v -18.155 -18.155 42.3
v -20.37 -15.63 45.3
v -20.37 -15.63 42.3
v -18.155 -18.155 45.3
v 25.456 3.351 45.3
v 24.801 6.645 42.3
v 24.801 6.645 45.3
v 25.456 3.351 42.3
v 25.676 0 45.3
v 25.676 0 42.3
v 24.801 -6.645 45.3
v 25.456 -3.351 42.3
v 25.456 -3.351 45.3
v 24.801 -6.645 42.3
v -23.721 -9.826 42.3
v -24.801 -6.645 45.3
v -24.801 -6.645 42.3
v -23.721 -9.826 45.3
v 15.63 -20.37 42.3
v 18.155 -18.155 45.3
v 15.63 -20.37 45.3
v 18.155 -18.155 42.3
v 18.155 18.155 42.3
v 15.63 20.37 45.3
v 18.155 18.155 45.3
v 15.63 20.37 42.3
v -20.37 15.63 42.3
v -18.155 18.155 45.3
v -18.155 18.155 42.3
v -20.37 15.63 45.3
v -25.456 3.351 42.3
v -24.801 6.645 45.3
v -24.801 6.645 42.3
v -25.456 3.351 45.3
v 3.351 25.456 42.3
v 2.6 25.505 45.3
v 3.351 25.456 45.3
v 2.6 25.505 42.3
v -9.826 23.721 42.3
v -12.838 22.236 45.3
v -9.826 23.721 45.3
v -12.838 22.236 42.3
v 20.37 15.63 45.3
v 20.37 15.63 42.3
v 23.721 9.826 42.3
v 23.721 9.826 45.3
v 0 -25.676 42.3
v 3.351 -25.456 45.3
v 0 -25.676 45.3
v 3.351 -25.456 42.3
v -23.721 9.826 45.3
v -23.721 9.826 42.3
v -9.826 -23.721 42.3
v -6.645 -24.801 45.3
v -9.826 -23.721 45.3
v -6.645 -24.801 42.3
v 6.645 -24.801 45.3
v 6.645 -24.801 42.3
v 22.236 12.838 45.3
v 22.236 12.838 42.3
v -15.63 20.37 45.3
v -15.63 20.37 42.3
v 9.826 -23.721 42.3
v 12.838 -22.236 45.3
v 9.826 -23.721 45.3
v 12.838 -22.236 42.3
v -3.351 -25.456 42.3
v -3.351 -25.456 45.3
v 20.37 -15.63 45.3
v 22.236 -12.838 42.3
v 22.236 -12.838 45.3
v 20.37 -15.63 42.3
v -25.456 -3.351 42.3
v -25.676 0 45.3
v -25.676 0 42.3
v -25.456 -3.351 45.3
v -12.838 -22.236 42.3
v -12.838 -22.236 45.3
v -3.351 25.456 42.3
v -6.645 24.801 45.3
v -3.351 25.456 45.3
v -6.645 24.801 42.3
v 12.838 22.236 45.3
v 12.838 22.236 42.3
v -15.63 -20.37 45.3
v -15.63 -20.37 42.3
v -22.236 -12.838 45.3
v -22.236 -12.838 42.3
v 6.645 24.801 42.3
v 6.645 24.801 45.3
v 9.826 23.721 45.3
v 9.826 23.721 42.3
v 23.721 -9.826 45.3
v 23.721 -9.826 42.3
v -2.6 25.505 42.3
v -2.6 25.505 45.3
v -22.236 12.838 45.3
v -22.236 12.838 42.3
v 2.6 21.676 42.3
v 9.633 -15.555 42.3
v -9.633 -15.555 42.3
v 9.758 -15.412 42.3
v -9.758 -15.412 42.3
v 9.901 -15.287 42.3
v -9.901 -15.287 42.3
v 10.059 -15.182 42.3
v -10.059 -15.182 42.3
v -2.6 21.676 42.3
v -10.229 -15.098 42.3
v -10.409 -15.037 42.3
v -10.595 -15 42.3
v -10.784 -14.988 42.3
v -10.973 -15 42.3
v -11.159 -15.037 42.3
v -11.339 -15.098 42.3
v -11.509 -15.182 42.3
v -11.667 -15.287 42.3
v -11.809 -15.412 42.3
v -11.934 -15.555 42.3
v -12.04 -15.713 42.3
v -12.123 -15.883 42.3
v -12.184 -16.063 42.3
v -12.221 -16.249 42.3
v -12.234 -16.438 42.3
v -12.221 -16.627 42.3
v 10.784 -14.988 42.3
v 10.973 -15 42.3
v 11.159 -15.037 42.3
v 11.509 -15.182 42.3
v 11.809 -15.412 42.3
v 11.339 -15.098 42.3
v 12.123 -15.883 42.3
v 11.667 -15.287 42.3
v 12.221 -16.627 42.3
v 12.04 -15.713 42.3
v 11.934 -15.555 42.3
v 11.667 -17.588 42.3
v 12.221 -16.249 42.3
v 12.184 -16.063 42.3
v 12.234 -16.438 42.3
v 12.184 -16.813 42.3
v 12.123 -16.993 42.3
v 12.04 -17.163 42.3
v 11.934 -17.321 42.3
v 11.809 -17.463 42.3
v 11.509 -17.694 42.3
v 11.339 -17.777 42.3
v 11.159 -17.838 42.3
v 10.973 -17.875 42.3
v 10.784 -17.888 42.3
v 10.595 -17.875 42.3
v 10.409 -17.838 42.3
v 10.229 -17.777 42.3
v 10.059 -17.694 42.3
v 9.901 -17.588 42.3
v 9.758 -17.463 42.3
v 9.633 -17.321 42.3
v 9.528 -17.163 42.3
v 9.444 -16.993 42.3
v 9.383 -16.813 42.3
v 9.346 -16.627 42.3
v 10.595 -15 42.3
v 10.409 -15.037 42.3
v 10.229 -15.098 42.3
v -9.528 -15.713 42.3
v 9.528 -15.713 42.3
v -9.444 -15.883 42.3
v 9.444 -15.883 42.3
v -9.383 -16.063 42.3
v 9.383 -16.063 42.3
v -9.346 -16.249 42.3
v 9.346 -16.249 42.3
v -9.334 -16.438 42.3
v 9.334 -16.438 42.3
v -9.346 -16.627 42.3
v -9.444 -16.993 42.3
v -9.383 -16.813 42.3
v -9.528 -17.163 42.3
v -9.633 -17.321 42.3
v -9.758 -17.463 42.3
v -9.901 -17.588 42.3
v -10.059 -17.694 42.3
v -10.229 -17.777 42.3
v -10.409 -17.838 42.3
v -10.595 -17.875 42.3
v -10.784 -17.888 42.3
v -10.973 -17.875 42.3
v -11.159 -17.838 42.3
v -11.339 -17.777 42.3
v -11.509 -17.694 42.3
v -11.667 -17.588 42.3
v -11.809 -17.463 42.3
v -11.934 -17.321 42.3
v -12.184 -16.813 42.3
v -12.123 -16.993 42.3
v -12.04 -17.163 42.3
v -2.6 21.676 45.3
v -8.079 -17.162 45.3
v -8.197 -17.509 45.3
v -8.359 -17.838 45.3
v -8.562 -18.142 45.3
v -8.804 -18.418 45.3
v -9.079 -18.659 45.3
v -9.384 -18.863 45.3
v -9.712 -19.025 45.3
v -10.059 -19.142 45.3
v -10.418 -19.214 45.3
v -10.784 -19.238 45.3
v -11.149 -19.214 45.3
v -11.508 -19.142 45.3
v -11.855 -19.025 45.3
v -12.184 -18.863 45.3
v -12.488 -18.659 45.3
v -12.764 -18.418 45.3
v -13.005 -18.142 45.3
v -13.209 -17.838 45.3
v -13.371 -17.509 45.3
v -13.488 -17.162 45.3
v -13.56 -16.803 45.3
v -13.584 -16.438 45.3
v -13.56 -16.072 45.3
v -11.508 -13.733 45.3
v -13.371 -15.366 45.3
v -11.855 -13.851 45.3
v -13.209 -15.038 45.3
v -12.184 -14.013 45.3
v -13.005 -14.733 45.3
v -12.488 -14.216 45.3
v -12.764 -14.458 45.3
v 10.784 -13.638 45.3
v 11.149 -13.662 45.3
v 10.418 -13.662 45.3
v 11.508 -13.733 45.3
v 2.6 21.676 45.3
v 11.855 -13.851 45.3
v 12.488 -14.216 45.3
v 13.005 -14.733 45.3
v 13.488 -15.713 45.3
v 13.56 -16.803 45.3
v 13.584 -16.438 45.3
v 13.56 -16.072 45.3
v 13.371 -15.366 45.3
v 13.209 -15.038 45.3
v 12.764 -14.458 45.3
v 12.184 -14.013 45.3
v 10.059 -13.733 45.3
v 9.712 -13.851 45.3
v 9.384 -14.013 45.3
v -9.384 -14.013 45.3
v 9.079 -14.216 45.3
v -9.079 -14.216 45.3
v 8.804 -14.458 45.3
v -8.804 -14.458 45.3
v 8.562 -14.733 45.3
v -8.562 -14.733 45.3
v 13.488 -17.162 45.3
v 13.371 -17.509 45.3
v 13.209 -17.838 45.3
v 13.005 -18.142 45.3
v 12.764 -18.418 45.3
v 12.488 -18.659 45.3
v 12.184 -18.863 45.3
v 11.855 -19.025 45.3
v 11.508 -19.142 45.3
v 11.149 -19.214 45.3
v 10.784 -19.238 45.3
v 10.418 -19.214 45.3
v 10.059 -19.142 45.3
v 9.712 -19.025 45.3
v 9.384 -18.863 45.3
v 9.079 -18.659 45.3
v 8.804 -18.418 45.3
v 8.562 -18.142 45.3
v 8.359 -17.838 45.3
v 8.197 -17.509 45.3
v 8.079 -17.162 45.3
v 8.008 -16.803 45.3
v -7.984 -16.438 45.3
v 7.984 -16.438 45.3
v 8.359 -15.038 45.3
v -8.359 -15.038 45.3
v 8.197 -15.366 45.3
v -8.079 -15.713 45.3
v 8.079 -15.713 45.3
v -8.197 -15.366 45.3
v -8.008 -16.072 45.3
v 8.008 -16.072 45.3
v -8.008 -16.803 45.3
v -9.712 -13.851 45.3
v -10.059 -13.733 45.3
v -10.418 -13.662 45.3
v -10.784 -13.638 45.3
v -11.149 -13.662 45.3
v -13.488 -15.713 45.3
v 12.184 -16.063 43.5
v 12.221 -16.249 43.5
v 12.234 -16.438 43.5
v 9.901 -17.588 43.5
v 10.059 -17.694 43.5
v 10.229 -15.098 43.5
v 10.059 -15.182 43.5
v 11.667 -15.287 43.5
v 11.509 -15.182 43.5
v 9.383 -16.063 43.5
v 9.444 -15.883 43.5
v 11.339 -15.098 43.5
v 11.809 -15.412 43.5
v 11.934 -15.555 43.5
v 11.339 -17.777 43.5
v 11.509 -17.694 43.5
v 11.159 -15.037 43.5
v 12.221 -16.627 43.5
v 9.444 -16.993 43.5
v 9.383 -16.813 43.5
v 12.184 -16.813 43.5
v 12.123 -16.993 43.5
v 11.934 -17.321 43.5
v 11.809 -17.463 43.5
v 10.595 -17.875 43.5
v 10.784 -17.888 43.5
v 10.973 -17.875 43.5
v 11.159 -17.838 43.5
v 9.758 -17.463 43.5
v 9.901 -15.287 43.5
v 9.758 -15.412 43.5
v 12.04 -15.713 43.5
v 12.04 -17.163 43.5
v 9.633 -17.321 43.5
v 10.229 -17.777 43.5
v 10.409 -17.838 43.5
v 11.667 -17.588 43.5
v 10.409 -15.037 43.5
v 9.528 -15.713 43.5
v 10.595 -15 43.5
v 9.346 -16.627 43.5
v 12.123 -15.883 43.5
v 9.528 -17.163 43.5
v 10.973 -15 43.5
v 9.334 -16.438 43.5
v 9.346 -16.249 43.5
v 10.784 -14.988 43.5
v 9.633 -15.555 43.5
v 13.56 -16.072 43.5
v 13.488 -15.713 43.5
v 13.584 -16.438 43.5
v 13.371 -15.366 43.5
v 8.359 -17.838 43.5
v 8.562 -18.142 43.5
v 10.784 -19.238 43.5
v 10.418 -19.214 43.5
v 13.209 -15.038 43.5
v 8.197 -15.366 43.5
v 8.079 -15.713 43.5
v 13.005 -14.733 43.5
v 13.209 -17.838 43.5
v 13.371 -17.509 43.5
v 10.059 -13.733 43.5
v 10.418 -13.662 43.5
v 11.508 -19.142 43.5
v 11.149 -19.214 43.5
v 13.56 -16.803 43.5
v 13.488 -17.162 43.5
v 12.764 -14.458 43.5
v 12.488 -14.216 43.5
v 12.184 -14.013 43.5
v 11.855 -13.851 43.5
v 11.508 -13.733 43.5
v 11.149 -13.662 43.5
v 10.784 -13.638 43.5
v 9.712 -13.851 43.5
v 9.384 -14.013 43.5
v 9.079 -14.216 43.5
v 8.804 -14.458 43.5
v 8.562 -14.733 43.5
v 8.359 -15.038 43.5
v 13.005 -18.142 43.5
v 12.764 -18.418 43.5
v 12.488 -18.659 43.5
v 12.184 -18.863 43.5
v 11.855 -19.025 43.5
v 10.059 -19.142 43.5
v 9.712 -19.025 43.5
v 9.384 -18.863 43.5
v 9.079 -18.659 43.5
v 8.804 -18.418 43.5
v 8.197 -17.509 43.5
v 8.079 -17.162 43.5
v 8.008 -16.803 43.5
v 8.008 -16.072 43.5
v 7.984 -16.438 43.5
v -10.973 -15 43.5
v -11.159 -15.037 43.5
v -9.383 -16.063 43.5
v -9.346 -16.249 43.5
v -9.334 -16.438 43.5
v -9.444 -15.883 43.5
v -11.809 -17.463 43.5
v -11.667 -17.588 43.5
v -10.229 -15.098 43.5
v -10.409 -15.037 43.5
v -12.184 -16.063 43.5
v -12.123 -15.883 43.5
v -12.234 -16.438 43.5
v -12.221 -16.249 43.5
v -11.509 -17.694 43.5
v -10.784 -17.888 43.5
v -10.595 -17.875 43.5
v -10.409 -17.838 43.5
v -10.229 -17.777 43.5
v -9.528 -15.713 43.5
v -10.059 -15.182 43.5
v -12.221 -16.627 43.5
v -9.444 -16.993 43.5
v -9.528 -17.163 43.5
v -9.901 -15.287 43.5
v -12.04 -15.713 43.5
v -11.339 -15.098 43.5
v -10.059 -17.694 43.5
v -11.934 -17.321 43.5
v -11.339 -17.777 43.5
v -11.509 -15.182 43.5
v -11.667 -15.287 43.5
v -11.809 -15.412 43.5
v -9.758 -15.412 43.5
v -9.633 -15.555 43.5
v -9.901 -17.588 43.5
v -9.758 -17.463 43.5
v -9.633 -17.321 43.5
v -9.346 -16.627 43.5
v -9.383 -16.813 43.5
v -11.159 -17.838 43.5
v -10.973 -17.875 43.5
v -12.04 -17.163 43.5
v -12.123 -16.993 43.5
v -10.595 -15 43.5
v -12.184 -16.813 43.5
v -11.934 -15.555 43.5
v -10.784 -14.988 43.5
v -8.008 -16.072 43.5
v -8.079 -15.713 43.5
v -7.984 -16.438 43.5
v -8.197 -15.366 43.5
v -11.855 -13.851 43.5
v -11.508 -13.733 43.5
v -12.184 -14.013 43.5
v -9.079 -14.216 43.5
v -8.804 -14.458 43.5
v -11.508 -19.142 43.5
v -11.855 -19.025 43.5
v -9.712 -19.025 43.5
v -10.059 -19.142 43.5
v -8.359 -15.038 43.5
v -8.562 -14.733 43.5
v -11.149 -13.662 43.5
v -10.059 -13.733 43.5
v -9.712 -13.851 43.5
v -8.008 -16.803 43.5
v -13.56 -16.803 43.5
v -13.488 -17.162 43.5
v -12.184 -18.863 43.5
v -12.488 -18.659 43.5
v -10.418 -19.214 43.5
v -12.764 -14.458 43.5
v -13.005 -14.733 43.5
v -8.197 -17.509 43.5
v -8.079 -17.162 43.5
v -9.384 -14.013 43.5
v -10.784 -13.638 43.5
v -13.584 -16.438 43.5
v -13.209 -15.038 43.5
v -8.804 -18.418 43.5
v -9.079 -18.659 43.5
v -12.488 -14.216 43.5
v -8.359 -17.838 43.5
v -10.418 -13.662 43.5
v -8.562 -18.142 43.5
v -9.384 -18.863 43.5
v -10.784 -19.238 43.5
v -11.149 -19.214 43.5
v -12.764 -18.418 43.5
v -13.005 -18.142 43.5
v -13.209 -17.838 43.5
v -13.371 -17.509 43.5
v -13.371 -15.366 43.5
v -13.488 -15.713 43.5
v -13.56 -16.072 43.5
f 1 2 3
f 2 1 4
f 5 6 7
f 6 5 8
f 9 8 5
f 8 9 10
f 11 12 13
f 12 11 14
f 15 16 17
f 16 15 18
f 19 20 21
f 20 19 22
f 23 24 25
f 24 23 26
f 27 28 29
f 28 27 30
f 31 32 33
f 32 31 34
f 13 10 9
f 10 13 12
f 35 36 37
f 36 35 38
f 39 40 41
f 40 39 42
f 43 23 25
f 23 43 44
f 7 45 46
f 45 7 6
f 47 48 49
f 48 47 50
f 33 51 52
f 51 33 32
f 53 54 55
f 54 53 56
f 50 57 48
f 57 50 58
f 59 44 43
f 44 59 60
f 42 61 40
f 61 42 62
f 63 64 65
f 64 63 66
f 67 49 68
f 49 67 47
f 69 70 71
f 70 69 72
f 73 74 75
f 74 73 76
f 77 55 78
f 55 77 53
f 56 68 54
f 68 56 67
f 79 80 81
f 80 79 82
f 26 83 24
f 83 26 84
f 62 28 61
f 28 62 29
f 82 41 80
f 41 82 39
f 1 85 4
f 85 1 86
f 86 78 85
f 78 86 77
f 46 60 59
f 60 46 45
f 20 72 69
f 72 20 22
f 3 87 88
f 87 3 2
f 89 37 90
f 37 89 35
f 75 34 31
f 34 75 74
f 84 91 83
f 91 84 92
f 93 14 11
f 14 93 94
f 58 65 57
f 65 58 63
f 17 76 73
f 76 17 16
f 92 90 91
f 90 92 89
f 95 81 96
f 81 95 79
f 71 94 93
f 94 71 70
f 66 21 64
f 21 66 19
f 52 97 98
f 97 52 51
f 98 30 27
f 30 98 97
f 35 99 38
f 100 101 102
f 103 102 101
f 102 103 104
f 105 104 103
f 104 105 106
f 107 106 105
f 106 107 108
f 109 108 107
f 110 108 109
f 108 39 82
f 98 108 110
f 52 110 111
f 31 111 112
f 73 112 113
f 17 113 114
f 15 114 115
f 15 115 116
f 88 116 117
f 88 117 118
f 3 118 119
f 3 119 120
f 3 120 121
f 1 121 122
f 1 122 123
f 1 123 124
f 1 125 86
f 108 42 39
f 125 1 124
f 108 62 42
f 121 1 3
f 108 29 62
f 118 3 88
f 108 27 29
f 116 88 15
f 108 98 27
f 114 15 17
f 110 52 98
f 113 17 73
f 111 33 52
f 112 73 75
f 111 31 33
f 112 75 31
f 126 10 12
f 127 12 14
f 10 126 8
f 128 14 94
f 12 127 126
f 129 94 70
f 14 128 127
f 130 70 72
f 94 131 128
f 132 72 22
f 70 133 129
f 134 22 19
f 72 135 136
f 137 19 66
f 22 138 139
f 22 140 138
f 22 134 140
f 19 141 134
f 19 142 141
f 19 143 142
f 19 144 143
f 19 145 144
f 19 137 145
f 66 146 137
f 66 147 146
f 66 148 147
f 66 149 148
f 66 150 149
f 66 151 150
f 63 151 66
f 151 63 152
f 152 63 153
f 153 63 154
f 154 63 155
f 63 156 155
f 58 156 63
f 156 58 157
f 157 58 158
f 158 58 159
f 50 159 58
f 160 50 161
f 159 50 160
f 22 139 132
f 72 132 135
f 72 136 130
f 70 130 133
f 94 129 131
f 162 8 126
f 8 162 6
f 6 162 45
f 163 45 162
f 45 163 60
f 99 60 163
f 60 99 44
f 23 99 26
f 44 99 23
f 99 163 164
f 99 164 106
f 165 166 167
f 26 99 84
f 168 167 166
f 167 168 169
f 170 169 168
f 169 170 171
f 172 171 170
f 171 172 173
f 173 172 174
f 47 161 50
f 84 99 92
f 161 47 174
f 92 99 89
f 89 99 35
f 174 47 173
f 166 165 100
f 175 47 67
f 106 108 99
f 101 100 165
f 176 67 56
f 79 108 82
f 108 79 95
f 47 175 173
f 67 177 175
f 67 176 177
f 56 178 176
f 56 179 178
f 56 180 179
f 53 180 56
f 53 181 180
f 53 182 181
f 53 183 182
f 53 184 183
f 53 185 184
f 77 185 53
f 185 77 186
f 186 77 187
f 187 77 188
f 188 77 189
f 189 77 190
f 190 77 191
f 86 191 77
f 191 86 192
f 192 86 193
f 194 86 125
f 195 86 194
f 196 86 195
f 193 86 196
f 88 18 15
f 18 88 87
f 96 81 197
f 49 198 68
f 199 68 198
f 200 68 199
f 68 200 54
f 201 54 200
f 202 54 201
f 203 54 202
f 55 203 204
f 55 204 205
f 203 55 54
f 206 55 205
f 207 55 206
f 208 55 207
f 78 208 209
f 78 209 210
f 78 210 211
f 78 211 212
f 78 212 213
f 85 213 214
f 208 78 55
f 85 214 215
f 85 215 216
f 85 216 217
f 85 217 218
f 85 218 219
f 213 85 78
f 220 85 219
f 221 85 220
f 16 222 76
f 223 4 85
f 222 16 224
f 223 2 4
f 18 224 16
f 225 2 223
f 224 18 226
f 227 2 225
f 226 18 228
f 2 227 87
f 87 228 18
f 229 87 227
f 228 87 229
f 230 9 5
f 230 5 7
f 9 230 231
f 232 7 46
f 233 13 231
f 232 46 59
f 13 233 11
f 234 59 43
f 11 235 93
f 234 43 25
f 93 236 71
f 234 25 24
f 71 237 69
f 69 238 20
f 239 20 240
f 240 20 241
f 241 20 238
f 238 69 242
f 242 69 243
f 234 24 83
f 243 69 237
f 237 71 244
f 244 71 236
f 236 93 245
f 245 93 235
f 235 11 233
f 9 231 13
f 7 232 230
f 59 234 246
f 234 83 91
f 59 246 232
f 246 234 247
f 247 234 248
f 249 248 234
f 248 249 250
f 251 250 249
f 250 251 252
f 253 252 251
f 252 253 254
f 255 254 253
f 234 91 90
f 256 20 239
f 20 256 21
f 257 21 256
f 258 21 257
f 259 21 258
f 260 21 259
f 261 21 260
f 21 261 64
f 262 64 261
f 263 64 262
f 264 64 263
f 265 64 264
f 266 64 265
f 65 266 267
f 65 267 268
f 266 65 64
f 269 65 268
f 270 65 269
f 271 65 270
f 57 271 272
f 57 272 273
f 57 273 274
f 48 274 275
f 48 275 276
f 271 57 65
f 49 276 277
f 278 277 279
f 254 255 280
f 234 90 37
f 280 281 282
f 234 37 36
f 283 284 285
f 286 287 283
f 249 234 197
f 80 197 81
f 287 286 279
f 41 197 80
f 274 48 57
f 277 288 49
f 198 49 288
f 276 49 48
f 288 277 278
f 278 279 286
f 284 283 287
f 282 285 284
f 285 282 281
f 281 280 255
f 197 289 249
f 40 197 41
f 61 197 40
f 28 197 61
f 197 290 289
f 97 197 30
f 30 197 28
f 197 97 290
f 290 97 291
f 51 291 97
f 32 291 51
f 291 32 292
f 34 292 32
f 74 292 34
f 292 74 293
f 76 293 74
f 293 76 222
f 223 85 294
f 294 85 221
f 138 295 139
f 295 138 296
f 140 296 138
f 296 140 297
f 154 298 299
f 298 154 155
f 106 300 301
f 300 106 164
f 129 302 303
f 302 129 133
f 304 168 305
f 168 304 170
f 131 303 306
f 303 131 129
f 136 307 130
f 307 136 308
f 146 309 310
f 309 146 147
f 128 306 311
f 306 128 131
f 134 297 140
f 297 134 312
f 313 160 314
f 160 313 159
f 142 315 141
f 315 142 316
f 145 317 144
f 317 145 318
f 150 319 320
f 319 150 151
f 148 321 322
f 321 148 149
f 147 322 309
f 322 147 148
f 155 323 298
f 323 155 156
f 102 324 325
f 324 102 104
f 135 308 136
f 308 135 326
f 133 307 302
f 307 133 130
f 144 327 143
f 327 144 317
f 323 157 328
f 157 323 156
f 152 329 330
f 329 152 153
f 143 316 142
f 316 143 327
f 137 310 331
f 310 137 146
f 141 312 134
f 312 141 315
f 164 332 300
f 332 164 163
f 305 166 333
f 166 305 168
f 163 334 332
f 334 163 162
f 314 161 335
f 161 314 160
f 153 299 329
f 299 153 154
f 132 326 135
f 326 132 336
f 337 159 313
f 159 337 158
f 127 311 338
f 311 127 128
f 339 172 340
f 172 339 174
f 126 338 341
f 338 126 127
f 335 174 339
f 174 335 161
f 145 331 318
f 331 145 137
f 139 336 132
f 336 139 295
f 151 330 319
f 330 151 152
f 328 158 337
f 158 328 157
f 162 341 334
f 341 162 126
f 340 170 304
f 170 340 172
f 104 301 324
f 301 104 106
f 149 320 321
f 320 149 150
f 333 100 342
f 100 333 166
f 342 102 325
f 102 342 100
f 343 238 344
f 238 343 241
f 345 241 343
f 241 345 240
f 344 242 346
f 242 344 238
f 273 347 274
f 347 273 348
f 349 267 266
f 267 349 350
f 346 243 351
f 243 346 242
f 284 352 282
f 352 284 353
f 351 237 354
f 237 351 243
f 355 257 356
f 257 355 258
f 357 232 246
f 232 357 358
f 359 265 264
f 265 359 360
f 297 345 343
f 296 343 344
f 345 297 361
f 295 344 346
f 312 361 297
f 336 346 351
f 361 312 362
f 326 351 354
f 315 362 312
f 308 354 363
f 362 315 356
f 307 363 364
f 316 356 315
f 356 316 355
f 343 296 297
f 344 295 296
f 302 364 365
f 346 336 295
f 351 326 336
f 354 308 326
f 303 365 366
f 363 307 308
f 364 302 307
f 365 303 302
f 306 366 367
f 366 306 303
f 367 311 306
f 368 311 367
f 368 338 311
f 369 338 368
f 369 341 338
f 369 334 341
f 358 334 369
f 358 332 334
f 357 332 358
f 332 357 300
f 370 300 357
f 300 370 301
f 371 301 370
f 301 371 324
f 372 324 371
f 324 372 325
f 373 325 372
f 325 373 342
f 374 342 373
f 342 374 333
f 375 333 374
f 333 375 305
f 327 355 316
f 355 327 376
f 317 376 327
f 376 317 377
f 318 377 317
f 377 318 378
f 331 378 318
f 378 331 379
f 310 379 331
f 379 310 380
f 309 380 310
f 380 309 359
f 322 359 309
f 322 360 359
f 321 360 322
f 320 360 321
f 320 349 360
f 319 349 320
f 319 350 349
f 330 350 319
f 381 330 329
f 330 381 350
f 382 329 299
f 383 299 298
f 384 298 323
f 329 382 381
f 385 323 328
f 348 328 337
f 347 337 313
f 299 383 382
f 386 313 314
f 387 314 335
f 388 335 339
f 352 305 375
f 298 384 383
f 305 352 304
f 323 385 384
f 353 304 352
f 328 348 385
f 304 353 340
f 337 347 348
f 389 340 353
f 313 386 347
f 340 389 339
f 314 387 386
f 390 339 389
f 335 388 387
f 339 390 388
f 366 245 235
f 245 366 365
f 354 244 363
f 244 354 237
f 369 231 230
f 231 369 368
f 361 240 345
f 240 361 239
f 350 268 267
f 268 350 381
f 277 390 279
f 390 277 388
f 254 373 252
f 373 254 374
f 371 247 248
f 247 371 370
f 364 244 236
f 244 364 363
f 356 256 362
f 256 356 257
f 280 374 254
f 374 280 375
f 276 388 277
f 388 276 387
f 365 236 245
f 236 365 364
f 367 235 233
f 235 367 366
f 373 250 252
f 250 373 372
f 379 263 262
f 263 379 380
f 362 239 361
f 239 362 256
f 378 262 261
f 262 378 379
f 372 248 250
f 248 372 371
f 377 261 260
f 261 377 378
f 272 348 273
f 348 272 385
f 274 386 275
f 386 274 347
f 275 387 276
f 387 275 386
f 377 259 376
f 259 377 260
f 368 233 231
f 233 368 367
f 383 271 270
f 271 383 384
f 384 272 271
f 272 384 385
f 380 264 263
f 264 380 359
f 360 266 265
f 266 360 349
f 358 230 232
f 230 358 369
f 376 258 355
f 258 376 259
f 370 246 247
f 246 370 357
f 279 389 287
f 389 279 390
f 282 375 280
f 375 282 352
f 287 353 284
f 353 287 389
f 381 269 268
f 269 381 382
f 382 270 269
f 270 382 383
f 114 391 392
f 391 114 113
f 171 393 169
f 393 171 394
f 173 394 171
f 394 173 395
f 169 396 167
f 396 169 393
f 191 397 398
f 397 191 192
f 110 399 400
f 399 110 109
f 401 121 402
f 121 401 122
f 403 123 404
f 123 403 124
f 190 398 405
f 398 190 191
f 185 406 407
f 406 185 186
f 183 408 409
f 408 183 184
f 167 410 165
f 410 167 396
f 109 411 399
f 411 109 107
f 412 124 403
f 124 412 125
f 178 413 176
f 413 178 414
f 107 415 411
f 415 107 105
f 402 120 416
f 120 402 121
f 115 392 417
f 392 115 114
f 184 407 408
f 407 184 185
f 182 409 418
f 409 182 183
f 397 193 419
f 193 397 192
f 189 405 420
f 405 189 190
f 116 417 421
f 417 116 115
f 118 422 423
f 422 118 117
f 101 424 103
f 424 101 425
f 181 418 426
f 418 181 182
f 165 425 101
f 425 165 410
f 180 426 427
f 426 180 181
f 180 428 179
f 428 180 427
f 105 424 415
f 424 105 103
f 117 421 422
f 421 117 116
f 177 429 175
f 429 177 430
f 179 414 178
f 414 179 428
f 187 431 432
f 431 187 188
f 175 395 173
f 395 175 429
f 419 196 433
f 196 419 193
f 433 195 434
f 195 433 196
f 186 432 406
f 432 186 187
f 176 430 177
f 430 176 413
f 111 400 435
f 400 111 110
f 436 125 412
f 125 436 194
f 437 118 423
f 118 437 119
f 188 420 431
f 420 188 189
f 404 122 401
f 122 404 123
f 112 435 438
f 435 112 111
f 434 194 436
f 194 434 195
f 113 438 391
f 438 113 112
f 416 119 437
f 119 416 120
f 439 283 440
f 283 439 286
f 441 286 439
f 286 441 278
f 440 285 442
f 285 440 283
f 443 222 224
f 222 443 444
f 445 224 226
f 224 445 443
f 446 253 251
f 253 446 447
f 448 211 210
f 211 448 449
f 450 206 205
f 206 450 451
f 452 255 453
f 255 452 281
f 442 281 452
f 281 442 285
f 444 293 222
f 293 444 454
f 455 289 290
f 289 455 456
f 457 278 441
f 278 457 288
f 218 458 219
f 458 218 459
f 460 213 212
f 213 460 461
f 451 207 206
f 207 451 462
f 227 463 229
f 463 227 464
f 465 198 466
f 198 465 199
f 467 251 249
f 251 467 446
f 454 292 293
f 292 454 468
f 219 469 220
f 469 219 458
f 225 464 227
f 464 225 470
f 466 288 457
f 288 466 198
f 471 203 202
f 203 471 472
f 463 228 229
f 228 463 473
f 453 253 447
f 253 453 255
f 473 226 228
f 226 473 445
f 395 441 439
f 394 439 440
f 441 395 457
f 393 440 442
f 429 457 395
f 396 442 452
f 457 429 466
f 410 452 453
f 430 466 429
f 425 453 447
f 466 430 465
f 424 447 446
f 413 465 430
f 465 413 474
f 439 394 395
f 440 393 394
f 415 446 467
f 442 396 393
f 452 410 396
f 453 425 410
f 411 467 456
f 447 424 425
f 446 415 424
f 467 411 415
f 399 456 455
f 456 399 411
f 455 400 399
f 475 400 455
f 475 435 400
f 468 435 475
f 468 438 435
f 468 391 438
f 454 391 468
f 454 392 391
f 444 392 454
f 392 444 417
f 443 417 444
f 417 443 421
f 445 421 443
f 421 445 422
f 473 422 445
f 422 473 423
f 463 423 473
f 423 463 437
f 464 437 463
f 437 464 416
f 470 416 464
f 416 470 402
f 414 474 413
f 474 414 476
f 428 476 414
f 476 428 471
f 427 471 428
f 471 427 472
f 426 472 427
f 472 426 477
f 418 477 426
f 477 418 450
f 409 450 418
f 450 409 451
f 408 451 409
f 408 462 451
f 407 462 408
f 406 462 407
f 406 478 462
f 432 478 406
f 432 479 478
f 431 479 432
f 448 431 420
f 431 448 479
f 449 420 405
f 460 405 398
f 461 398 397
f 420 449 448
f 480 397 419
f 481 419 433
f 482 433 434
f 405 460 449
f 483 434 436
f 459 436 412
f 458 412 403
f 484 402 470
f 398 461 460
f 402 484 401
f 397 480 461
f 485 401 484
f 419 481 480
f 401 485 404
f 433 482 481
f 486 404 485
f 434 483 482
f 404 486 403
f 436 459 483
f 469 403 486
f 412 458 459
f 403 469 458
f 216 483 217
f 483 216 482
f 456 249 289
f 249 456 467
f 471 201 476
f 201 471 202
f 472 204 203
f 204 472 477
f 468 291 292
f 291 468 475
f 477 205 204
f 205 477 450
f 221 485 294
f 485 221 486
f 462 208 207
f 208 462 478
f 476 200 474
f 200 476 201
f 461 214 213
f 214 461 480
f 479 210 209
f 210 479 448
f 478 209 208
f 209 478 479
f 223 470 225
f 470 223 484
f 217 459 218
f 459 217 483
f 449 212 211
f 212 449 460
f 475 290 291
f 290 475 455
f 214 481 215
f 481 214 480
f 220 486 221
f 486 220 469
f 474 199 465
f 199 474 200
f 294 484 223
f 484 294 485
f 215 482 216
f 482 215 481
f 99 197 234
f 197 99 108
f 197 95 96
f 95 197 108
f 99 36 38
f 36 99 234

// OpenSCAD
// left cartridge_cap_yaw: press F6 (render) then File > Export > STL
include <../lib/g1_servo_arm.scad>
side = "left";
part = "cartridge_cap_yaw";
